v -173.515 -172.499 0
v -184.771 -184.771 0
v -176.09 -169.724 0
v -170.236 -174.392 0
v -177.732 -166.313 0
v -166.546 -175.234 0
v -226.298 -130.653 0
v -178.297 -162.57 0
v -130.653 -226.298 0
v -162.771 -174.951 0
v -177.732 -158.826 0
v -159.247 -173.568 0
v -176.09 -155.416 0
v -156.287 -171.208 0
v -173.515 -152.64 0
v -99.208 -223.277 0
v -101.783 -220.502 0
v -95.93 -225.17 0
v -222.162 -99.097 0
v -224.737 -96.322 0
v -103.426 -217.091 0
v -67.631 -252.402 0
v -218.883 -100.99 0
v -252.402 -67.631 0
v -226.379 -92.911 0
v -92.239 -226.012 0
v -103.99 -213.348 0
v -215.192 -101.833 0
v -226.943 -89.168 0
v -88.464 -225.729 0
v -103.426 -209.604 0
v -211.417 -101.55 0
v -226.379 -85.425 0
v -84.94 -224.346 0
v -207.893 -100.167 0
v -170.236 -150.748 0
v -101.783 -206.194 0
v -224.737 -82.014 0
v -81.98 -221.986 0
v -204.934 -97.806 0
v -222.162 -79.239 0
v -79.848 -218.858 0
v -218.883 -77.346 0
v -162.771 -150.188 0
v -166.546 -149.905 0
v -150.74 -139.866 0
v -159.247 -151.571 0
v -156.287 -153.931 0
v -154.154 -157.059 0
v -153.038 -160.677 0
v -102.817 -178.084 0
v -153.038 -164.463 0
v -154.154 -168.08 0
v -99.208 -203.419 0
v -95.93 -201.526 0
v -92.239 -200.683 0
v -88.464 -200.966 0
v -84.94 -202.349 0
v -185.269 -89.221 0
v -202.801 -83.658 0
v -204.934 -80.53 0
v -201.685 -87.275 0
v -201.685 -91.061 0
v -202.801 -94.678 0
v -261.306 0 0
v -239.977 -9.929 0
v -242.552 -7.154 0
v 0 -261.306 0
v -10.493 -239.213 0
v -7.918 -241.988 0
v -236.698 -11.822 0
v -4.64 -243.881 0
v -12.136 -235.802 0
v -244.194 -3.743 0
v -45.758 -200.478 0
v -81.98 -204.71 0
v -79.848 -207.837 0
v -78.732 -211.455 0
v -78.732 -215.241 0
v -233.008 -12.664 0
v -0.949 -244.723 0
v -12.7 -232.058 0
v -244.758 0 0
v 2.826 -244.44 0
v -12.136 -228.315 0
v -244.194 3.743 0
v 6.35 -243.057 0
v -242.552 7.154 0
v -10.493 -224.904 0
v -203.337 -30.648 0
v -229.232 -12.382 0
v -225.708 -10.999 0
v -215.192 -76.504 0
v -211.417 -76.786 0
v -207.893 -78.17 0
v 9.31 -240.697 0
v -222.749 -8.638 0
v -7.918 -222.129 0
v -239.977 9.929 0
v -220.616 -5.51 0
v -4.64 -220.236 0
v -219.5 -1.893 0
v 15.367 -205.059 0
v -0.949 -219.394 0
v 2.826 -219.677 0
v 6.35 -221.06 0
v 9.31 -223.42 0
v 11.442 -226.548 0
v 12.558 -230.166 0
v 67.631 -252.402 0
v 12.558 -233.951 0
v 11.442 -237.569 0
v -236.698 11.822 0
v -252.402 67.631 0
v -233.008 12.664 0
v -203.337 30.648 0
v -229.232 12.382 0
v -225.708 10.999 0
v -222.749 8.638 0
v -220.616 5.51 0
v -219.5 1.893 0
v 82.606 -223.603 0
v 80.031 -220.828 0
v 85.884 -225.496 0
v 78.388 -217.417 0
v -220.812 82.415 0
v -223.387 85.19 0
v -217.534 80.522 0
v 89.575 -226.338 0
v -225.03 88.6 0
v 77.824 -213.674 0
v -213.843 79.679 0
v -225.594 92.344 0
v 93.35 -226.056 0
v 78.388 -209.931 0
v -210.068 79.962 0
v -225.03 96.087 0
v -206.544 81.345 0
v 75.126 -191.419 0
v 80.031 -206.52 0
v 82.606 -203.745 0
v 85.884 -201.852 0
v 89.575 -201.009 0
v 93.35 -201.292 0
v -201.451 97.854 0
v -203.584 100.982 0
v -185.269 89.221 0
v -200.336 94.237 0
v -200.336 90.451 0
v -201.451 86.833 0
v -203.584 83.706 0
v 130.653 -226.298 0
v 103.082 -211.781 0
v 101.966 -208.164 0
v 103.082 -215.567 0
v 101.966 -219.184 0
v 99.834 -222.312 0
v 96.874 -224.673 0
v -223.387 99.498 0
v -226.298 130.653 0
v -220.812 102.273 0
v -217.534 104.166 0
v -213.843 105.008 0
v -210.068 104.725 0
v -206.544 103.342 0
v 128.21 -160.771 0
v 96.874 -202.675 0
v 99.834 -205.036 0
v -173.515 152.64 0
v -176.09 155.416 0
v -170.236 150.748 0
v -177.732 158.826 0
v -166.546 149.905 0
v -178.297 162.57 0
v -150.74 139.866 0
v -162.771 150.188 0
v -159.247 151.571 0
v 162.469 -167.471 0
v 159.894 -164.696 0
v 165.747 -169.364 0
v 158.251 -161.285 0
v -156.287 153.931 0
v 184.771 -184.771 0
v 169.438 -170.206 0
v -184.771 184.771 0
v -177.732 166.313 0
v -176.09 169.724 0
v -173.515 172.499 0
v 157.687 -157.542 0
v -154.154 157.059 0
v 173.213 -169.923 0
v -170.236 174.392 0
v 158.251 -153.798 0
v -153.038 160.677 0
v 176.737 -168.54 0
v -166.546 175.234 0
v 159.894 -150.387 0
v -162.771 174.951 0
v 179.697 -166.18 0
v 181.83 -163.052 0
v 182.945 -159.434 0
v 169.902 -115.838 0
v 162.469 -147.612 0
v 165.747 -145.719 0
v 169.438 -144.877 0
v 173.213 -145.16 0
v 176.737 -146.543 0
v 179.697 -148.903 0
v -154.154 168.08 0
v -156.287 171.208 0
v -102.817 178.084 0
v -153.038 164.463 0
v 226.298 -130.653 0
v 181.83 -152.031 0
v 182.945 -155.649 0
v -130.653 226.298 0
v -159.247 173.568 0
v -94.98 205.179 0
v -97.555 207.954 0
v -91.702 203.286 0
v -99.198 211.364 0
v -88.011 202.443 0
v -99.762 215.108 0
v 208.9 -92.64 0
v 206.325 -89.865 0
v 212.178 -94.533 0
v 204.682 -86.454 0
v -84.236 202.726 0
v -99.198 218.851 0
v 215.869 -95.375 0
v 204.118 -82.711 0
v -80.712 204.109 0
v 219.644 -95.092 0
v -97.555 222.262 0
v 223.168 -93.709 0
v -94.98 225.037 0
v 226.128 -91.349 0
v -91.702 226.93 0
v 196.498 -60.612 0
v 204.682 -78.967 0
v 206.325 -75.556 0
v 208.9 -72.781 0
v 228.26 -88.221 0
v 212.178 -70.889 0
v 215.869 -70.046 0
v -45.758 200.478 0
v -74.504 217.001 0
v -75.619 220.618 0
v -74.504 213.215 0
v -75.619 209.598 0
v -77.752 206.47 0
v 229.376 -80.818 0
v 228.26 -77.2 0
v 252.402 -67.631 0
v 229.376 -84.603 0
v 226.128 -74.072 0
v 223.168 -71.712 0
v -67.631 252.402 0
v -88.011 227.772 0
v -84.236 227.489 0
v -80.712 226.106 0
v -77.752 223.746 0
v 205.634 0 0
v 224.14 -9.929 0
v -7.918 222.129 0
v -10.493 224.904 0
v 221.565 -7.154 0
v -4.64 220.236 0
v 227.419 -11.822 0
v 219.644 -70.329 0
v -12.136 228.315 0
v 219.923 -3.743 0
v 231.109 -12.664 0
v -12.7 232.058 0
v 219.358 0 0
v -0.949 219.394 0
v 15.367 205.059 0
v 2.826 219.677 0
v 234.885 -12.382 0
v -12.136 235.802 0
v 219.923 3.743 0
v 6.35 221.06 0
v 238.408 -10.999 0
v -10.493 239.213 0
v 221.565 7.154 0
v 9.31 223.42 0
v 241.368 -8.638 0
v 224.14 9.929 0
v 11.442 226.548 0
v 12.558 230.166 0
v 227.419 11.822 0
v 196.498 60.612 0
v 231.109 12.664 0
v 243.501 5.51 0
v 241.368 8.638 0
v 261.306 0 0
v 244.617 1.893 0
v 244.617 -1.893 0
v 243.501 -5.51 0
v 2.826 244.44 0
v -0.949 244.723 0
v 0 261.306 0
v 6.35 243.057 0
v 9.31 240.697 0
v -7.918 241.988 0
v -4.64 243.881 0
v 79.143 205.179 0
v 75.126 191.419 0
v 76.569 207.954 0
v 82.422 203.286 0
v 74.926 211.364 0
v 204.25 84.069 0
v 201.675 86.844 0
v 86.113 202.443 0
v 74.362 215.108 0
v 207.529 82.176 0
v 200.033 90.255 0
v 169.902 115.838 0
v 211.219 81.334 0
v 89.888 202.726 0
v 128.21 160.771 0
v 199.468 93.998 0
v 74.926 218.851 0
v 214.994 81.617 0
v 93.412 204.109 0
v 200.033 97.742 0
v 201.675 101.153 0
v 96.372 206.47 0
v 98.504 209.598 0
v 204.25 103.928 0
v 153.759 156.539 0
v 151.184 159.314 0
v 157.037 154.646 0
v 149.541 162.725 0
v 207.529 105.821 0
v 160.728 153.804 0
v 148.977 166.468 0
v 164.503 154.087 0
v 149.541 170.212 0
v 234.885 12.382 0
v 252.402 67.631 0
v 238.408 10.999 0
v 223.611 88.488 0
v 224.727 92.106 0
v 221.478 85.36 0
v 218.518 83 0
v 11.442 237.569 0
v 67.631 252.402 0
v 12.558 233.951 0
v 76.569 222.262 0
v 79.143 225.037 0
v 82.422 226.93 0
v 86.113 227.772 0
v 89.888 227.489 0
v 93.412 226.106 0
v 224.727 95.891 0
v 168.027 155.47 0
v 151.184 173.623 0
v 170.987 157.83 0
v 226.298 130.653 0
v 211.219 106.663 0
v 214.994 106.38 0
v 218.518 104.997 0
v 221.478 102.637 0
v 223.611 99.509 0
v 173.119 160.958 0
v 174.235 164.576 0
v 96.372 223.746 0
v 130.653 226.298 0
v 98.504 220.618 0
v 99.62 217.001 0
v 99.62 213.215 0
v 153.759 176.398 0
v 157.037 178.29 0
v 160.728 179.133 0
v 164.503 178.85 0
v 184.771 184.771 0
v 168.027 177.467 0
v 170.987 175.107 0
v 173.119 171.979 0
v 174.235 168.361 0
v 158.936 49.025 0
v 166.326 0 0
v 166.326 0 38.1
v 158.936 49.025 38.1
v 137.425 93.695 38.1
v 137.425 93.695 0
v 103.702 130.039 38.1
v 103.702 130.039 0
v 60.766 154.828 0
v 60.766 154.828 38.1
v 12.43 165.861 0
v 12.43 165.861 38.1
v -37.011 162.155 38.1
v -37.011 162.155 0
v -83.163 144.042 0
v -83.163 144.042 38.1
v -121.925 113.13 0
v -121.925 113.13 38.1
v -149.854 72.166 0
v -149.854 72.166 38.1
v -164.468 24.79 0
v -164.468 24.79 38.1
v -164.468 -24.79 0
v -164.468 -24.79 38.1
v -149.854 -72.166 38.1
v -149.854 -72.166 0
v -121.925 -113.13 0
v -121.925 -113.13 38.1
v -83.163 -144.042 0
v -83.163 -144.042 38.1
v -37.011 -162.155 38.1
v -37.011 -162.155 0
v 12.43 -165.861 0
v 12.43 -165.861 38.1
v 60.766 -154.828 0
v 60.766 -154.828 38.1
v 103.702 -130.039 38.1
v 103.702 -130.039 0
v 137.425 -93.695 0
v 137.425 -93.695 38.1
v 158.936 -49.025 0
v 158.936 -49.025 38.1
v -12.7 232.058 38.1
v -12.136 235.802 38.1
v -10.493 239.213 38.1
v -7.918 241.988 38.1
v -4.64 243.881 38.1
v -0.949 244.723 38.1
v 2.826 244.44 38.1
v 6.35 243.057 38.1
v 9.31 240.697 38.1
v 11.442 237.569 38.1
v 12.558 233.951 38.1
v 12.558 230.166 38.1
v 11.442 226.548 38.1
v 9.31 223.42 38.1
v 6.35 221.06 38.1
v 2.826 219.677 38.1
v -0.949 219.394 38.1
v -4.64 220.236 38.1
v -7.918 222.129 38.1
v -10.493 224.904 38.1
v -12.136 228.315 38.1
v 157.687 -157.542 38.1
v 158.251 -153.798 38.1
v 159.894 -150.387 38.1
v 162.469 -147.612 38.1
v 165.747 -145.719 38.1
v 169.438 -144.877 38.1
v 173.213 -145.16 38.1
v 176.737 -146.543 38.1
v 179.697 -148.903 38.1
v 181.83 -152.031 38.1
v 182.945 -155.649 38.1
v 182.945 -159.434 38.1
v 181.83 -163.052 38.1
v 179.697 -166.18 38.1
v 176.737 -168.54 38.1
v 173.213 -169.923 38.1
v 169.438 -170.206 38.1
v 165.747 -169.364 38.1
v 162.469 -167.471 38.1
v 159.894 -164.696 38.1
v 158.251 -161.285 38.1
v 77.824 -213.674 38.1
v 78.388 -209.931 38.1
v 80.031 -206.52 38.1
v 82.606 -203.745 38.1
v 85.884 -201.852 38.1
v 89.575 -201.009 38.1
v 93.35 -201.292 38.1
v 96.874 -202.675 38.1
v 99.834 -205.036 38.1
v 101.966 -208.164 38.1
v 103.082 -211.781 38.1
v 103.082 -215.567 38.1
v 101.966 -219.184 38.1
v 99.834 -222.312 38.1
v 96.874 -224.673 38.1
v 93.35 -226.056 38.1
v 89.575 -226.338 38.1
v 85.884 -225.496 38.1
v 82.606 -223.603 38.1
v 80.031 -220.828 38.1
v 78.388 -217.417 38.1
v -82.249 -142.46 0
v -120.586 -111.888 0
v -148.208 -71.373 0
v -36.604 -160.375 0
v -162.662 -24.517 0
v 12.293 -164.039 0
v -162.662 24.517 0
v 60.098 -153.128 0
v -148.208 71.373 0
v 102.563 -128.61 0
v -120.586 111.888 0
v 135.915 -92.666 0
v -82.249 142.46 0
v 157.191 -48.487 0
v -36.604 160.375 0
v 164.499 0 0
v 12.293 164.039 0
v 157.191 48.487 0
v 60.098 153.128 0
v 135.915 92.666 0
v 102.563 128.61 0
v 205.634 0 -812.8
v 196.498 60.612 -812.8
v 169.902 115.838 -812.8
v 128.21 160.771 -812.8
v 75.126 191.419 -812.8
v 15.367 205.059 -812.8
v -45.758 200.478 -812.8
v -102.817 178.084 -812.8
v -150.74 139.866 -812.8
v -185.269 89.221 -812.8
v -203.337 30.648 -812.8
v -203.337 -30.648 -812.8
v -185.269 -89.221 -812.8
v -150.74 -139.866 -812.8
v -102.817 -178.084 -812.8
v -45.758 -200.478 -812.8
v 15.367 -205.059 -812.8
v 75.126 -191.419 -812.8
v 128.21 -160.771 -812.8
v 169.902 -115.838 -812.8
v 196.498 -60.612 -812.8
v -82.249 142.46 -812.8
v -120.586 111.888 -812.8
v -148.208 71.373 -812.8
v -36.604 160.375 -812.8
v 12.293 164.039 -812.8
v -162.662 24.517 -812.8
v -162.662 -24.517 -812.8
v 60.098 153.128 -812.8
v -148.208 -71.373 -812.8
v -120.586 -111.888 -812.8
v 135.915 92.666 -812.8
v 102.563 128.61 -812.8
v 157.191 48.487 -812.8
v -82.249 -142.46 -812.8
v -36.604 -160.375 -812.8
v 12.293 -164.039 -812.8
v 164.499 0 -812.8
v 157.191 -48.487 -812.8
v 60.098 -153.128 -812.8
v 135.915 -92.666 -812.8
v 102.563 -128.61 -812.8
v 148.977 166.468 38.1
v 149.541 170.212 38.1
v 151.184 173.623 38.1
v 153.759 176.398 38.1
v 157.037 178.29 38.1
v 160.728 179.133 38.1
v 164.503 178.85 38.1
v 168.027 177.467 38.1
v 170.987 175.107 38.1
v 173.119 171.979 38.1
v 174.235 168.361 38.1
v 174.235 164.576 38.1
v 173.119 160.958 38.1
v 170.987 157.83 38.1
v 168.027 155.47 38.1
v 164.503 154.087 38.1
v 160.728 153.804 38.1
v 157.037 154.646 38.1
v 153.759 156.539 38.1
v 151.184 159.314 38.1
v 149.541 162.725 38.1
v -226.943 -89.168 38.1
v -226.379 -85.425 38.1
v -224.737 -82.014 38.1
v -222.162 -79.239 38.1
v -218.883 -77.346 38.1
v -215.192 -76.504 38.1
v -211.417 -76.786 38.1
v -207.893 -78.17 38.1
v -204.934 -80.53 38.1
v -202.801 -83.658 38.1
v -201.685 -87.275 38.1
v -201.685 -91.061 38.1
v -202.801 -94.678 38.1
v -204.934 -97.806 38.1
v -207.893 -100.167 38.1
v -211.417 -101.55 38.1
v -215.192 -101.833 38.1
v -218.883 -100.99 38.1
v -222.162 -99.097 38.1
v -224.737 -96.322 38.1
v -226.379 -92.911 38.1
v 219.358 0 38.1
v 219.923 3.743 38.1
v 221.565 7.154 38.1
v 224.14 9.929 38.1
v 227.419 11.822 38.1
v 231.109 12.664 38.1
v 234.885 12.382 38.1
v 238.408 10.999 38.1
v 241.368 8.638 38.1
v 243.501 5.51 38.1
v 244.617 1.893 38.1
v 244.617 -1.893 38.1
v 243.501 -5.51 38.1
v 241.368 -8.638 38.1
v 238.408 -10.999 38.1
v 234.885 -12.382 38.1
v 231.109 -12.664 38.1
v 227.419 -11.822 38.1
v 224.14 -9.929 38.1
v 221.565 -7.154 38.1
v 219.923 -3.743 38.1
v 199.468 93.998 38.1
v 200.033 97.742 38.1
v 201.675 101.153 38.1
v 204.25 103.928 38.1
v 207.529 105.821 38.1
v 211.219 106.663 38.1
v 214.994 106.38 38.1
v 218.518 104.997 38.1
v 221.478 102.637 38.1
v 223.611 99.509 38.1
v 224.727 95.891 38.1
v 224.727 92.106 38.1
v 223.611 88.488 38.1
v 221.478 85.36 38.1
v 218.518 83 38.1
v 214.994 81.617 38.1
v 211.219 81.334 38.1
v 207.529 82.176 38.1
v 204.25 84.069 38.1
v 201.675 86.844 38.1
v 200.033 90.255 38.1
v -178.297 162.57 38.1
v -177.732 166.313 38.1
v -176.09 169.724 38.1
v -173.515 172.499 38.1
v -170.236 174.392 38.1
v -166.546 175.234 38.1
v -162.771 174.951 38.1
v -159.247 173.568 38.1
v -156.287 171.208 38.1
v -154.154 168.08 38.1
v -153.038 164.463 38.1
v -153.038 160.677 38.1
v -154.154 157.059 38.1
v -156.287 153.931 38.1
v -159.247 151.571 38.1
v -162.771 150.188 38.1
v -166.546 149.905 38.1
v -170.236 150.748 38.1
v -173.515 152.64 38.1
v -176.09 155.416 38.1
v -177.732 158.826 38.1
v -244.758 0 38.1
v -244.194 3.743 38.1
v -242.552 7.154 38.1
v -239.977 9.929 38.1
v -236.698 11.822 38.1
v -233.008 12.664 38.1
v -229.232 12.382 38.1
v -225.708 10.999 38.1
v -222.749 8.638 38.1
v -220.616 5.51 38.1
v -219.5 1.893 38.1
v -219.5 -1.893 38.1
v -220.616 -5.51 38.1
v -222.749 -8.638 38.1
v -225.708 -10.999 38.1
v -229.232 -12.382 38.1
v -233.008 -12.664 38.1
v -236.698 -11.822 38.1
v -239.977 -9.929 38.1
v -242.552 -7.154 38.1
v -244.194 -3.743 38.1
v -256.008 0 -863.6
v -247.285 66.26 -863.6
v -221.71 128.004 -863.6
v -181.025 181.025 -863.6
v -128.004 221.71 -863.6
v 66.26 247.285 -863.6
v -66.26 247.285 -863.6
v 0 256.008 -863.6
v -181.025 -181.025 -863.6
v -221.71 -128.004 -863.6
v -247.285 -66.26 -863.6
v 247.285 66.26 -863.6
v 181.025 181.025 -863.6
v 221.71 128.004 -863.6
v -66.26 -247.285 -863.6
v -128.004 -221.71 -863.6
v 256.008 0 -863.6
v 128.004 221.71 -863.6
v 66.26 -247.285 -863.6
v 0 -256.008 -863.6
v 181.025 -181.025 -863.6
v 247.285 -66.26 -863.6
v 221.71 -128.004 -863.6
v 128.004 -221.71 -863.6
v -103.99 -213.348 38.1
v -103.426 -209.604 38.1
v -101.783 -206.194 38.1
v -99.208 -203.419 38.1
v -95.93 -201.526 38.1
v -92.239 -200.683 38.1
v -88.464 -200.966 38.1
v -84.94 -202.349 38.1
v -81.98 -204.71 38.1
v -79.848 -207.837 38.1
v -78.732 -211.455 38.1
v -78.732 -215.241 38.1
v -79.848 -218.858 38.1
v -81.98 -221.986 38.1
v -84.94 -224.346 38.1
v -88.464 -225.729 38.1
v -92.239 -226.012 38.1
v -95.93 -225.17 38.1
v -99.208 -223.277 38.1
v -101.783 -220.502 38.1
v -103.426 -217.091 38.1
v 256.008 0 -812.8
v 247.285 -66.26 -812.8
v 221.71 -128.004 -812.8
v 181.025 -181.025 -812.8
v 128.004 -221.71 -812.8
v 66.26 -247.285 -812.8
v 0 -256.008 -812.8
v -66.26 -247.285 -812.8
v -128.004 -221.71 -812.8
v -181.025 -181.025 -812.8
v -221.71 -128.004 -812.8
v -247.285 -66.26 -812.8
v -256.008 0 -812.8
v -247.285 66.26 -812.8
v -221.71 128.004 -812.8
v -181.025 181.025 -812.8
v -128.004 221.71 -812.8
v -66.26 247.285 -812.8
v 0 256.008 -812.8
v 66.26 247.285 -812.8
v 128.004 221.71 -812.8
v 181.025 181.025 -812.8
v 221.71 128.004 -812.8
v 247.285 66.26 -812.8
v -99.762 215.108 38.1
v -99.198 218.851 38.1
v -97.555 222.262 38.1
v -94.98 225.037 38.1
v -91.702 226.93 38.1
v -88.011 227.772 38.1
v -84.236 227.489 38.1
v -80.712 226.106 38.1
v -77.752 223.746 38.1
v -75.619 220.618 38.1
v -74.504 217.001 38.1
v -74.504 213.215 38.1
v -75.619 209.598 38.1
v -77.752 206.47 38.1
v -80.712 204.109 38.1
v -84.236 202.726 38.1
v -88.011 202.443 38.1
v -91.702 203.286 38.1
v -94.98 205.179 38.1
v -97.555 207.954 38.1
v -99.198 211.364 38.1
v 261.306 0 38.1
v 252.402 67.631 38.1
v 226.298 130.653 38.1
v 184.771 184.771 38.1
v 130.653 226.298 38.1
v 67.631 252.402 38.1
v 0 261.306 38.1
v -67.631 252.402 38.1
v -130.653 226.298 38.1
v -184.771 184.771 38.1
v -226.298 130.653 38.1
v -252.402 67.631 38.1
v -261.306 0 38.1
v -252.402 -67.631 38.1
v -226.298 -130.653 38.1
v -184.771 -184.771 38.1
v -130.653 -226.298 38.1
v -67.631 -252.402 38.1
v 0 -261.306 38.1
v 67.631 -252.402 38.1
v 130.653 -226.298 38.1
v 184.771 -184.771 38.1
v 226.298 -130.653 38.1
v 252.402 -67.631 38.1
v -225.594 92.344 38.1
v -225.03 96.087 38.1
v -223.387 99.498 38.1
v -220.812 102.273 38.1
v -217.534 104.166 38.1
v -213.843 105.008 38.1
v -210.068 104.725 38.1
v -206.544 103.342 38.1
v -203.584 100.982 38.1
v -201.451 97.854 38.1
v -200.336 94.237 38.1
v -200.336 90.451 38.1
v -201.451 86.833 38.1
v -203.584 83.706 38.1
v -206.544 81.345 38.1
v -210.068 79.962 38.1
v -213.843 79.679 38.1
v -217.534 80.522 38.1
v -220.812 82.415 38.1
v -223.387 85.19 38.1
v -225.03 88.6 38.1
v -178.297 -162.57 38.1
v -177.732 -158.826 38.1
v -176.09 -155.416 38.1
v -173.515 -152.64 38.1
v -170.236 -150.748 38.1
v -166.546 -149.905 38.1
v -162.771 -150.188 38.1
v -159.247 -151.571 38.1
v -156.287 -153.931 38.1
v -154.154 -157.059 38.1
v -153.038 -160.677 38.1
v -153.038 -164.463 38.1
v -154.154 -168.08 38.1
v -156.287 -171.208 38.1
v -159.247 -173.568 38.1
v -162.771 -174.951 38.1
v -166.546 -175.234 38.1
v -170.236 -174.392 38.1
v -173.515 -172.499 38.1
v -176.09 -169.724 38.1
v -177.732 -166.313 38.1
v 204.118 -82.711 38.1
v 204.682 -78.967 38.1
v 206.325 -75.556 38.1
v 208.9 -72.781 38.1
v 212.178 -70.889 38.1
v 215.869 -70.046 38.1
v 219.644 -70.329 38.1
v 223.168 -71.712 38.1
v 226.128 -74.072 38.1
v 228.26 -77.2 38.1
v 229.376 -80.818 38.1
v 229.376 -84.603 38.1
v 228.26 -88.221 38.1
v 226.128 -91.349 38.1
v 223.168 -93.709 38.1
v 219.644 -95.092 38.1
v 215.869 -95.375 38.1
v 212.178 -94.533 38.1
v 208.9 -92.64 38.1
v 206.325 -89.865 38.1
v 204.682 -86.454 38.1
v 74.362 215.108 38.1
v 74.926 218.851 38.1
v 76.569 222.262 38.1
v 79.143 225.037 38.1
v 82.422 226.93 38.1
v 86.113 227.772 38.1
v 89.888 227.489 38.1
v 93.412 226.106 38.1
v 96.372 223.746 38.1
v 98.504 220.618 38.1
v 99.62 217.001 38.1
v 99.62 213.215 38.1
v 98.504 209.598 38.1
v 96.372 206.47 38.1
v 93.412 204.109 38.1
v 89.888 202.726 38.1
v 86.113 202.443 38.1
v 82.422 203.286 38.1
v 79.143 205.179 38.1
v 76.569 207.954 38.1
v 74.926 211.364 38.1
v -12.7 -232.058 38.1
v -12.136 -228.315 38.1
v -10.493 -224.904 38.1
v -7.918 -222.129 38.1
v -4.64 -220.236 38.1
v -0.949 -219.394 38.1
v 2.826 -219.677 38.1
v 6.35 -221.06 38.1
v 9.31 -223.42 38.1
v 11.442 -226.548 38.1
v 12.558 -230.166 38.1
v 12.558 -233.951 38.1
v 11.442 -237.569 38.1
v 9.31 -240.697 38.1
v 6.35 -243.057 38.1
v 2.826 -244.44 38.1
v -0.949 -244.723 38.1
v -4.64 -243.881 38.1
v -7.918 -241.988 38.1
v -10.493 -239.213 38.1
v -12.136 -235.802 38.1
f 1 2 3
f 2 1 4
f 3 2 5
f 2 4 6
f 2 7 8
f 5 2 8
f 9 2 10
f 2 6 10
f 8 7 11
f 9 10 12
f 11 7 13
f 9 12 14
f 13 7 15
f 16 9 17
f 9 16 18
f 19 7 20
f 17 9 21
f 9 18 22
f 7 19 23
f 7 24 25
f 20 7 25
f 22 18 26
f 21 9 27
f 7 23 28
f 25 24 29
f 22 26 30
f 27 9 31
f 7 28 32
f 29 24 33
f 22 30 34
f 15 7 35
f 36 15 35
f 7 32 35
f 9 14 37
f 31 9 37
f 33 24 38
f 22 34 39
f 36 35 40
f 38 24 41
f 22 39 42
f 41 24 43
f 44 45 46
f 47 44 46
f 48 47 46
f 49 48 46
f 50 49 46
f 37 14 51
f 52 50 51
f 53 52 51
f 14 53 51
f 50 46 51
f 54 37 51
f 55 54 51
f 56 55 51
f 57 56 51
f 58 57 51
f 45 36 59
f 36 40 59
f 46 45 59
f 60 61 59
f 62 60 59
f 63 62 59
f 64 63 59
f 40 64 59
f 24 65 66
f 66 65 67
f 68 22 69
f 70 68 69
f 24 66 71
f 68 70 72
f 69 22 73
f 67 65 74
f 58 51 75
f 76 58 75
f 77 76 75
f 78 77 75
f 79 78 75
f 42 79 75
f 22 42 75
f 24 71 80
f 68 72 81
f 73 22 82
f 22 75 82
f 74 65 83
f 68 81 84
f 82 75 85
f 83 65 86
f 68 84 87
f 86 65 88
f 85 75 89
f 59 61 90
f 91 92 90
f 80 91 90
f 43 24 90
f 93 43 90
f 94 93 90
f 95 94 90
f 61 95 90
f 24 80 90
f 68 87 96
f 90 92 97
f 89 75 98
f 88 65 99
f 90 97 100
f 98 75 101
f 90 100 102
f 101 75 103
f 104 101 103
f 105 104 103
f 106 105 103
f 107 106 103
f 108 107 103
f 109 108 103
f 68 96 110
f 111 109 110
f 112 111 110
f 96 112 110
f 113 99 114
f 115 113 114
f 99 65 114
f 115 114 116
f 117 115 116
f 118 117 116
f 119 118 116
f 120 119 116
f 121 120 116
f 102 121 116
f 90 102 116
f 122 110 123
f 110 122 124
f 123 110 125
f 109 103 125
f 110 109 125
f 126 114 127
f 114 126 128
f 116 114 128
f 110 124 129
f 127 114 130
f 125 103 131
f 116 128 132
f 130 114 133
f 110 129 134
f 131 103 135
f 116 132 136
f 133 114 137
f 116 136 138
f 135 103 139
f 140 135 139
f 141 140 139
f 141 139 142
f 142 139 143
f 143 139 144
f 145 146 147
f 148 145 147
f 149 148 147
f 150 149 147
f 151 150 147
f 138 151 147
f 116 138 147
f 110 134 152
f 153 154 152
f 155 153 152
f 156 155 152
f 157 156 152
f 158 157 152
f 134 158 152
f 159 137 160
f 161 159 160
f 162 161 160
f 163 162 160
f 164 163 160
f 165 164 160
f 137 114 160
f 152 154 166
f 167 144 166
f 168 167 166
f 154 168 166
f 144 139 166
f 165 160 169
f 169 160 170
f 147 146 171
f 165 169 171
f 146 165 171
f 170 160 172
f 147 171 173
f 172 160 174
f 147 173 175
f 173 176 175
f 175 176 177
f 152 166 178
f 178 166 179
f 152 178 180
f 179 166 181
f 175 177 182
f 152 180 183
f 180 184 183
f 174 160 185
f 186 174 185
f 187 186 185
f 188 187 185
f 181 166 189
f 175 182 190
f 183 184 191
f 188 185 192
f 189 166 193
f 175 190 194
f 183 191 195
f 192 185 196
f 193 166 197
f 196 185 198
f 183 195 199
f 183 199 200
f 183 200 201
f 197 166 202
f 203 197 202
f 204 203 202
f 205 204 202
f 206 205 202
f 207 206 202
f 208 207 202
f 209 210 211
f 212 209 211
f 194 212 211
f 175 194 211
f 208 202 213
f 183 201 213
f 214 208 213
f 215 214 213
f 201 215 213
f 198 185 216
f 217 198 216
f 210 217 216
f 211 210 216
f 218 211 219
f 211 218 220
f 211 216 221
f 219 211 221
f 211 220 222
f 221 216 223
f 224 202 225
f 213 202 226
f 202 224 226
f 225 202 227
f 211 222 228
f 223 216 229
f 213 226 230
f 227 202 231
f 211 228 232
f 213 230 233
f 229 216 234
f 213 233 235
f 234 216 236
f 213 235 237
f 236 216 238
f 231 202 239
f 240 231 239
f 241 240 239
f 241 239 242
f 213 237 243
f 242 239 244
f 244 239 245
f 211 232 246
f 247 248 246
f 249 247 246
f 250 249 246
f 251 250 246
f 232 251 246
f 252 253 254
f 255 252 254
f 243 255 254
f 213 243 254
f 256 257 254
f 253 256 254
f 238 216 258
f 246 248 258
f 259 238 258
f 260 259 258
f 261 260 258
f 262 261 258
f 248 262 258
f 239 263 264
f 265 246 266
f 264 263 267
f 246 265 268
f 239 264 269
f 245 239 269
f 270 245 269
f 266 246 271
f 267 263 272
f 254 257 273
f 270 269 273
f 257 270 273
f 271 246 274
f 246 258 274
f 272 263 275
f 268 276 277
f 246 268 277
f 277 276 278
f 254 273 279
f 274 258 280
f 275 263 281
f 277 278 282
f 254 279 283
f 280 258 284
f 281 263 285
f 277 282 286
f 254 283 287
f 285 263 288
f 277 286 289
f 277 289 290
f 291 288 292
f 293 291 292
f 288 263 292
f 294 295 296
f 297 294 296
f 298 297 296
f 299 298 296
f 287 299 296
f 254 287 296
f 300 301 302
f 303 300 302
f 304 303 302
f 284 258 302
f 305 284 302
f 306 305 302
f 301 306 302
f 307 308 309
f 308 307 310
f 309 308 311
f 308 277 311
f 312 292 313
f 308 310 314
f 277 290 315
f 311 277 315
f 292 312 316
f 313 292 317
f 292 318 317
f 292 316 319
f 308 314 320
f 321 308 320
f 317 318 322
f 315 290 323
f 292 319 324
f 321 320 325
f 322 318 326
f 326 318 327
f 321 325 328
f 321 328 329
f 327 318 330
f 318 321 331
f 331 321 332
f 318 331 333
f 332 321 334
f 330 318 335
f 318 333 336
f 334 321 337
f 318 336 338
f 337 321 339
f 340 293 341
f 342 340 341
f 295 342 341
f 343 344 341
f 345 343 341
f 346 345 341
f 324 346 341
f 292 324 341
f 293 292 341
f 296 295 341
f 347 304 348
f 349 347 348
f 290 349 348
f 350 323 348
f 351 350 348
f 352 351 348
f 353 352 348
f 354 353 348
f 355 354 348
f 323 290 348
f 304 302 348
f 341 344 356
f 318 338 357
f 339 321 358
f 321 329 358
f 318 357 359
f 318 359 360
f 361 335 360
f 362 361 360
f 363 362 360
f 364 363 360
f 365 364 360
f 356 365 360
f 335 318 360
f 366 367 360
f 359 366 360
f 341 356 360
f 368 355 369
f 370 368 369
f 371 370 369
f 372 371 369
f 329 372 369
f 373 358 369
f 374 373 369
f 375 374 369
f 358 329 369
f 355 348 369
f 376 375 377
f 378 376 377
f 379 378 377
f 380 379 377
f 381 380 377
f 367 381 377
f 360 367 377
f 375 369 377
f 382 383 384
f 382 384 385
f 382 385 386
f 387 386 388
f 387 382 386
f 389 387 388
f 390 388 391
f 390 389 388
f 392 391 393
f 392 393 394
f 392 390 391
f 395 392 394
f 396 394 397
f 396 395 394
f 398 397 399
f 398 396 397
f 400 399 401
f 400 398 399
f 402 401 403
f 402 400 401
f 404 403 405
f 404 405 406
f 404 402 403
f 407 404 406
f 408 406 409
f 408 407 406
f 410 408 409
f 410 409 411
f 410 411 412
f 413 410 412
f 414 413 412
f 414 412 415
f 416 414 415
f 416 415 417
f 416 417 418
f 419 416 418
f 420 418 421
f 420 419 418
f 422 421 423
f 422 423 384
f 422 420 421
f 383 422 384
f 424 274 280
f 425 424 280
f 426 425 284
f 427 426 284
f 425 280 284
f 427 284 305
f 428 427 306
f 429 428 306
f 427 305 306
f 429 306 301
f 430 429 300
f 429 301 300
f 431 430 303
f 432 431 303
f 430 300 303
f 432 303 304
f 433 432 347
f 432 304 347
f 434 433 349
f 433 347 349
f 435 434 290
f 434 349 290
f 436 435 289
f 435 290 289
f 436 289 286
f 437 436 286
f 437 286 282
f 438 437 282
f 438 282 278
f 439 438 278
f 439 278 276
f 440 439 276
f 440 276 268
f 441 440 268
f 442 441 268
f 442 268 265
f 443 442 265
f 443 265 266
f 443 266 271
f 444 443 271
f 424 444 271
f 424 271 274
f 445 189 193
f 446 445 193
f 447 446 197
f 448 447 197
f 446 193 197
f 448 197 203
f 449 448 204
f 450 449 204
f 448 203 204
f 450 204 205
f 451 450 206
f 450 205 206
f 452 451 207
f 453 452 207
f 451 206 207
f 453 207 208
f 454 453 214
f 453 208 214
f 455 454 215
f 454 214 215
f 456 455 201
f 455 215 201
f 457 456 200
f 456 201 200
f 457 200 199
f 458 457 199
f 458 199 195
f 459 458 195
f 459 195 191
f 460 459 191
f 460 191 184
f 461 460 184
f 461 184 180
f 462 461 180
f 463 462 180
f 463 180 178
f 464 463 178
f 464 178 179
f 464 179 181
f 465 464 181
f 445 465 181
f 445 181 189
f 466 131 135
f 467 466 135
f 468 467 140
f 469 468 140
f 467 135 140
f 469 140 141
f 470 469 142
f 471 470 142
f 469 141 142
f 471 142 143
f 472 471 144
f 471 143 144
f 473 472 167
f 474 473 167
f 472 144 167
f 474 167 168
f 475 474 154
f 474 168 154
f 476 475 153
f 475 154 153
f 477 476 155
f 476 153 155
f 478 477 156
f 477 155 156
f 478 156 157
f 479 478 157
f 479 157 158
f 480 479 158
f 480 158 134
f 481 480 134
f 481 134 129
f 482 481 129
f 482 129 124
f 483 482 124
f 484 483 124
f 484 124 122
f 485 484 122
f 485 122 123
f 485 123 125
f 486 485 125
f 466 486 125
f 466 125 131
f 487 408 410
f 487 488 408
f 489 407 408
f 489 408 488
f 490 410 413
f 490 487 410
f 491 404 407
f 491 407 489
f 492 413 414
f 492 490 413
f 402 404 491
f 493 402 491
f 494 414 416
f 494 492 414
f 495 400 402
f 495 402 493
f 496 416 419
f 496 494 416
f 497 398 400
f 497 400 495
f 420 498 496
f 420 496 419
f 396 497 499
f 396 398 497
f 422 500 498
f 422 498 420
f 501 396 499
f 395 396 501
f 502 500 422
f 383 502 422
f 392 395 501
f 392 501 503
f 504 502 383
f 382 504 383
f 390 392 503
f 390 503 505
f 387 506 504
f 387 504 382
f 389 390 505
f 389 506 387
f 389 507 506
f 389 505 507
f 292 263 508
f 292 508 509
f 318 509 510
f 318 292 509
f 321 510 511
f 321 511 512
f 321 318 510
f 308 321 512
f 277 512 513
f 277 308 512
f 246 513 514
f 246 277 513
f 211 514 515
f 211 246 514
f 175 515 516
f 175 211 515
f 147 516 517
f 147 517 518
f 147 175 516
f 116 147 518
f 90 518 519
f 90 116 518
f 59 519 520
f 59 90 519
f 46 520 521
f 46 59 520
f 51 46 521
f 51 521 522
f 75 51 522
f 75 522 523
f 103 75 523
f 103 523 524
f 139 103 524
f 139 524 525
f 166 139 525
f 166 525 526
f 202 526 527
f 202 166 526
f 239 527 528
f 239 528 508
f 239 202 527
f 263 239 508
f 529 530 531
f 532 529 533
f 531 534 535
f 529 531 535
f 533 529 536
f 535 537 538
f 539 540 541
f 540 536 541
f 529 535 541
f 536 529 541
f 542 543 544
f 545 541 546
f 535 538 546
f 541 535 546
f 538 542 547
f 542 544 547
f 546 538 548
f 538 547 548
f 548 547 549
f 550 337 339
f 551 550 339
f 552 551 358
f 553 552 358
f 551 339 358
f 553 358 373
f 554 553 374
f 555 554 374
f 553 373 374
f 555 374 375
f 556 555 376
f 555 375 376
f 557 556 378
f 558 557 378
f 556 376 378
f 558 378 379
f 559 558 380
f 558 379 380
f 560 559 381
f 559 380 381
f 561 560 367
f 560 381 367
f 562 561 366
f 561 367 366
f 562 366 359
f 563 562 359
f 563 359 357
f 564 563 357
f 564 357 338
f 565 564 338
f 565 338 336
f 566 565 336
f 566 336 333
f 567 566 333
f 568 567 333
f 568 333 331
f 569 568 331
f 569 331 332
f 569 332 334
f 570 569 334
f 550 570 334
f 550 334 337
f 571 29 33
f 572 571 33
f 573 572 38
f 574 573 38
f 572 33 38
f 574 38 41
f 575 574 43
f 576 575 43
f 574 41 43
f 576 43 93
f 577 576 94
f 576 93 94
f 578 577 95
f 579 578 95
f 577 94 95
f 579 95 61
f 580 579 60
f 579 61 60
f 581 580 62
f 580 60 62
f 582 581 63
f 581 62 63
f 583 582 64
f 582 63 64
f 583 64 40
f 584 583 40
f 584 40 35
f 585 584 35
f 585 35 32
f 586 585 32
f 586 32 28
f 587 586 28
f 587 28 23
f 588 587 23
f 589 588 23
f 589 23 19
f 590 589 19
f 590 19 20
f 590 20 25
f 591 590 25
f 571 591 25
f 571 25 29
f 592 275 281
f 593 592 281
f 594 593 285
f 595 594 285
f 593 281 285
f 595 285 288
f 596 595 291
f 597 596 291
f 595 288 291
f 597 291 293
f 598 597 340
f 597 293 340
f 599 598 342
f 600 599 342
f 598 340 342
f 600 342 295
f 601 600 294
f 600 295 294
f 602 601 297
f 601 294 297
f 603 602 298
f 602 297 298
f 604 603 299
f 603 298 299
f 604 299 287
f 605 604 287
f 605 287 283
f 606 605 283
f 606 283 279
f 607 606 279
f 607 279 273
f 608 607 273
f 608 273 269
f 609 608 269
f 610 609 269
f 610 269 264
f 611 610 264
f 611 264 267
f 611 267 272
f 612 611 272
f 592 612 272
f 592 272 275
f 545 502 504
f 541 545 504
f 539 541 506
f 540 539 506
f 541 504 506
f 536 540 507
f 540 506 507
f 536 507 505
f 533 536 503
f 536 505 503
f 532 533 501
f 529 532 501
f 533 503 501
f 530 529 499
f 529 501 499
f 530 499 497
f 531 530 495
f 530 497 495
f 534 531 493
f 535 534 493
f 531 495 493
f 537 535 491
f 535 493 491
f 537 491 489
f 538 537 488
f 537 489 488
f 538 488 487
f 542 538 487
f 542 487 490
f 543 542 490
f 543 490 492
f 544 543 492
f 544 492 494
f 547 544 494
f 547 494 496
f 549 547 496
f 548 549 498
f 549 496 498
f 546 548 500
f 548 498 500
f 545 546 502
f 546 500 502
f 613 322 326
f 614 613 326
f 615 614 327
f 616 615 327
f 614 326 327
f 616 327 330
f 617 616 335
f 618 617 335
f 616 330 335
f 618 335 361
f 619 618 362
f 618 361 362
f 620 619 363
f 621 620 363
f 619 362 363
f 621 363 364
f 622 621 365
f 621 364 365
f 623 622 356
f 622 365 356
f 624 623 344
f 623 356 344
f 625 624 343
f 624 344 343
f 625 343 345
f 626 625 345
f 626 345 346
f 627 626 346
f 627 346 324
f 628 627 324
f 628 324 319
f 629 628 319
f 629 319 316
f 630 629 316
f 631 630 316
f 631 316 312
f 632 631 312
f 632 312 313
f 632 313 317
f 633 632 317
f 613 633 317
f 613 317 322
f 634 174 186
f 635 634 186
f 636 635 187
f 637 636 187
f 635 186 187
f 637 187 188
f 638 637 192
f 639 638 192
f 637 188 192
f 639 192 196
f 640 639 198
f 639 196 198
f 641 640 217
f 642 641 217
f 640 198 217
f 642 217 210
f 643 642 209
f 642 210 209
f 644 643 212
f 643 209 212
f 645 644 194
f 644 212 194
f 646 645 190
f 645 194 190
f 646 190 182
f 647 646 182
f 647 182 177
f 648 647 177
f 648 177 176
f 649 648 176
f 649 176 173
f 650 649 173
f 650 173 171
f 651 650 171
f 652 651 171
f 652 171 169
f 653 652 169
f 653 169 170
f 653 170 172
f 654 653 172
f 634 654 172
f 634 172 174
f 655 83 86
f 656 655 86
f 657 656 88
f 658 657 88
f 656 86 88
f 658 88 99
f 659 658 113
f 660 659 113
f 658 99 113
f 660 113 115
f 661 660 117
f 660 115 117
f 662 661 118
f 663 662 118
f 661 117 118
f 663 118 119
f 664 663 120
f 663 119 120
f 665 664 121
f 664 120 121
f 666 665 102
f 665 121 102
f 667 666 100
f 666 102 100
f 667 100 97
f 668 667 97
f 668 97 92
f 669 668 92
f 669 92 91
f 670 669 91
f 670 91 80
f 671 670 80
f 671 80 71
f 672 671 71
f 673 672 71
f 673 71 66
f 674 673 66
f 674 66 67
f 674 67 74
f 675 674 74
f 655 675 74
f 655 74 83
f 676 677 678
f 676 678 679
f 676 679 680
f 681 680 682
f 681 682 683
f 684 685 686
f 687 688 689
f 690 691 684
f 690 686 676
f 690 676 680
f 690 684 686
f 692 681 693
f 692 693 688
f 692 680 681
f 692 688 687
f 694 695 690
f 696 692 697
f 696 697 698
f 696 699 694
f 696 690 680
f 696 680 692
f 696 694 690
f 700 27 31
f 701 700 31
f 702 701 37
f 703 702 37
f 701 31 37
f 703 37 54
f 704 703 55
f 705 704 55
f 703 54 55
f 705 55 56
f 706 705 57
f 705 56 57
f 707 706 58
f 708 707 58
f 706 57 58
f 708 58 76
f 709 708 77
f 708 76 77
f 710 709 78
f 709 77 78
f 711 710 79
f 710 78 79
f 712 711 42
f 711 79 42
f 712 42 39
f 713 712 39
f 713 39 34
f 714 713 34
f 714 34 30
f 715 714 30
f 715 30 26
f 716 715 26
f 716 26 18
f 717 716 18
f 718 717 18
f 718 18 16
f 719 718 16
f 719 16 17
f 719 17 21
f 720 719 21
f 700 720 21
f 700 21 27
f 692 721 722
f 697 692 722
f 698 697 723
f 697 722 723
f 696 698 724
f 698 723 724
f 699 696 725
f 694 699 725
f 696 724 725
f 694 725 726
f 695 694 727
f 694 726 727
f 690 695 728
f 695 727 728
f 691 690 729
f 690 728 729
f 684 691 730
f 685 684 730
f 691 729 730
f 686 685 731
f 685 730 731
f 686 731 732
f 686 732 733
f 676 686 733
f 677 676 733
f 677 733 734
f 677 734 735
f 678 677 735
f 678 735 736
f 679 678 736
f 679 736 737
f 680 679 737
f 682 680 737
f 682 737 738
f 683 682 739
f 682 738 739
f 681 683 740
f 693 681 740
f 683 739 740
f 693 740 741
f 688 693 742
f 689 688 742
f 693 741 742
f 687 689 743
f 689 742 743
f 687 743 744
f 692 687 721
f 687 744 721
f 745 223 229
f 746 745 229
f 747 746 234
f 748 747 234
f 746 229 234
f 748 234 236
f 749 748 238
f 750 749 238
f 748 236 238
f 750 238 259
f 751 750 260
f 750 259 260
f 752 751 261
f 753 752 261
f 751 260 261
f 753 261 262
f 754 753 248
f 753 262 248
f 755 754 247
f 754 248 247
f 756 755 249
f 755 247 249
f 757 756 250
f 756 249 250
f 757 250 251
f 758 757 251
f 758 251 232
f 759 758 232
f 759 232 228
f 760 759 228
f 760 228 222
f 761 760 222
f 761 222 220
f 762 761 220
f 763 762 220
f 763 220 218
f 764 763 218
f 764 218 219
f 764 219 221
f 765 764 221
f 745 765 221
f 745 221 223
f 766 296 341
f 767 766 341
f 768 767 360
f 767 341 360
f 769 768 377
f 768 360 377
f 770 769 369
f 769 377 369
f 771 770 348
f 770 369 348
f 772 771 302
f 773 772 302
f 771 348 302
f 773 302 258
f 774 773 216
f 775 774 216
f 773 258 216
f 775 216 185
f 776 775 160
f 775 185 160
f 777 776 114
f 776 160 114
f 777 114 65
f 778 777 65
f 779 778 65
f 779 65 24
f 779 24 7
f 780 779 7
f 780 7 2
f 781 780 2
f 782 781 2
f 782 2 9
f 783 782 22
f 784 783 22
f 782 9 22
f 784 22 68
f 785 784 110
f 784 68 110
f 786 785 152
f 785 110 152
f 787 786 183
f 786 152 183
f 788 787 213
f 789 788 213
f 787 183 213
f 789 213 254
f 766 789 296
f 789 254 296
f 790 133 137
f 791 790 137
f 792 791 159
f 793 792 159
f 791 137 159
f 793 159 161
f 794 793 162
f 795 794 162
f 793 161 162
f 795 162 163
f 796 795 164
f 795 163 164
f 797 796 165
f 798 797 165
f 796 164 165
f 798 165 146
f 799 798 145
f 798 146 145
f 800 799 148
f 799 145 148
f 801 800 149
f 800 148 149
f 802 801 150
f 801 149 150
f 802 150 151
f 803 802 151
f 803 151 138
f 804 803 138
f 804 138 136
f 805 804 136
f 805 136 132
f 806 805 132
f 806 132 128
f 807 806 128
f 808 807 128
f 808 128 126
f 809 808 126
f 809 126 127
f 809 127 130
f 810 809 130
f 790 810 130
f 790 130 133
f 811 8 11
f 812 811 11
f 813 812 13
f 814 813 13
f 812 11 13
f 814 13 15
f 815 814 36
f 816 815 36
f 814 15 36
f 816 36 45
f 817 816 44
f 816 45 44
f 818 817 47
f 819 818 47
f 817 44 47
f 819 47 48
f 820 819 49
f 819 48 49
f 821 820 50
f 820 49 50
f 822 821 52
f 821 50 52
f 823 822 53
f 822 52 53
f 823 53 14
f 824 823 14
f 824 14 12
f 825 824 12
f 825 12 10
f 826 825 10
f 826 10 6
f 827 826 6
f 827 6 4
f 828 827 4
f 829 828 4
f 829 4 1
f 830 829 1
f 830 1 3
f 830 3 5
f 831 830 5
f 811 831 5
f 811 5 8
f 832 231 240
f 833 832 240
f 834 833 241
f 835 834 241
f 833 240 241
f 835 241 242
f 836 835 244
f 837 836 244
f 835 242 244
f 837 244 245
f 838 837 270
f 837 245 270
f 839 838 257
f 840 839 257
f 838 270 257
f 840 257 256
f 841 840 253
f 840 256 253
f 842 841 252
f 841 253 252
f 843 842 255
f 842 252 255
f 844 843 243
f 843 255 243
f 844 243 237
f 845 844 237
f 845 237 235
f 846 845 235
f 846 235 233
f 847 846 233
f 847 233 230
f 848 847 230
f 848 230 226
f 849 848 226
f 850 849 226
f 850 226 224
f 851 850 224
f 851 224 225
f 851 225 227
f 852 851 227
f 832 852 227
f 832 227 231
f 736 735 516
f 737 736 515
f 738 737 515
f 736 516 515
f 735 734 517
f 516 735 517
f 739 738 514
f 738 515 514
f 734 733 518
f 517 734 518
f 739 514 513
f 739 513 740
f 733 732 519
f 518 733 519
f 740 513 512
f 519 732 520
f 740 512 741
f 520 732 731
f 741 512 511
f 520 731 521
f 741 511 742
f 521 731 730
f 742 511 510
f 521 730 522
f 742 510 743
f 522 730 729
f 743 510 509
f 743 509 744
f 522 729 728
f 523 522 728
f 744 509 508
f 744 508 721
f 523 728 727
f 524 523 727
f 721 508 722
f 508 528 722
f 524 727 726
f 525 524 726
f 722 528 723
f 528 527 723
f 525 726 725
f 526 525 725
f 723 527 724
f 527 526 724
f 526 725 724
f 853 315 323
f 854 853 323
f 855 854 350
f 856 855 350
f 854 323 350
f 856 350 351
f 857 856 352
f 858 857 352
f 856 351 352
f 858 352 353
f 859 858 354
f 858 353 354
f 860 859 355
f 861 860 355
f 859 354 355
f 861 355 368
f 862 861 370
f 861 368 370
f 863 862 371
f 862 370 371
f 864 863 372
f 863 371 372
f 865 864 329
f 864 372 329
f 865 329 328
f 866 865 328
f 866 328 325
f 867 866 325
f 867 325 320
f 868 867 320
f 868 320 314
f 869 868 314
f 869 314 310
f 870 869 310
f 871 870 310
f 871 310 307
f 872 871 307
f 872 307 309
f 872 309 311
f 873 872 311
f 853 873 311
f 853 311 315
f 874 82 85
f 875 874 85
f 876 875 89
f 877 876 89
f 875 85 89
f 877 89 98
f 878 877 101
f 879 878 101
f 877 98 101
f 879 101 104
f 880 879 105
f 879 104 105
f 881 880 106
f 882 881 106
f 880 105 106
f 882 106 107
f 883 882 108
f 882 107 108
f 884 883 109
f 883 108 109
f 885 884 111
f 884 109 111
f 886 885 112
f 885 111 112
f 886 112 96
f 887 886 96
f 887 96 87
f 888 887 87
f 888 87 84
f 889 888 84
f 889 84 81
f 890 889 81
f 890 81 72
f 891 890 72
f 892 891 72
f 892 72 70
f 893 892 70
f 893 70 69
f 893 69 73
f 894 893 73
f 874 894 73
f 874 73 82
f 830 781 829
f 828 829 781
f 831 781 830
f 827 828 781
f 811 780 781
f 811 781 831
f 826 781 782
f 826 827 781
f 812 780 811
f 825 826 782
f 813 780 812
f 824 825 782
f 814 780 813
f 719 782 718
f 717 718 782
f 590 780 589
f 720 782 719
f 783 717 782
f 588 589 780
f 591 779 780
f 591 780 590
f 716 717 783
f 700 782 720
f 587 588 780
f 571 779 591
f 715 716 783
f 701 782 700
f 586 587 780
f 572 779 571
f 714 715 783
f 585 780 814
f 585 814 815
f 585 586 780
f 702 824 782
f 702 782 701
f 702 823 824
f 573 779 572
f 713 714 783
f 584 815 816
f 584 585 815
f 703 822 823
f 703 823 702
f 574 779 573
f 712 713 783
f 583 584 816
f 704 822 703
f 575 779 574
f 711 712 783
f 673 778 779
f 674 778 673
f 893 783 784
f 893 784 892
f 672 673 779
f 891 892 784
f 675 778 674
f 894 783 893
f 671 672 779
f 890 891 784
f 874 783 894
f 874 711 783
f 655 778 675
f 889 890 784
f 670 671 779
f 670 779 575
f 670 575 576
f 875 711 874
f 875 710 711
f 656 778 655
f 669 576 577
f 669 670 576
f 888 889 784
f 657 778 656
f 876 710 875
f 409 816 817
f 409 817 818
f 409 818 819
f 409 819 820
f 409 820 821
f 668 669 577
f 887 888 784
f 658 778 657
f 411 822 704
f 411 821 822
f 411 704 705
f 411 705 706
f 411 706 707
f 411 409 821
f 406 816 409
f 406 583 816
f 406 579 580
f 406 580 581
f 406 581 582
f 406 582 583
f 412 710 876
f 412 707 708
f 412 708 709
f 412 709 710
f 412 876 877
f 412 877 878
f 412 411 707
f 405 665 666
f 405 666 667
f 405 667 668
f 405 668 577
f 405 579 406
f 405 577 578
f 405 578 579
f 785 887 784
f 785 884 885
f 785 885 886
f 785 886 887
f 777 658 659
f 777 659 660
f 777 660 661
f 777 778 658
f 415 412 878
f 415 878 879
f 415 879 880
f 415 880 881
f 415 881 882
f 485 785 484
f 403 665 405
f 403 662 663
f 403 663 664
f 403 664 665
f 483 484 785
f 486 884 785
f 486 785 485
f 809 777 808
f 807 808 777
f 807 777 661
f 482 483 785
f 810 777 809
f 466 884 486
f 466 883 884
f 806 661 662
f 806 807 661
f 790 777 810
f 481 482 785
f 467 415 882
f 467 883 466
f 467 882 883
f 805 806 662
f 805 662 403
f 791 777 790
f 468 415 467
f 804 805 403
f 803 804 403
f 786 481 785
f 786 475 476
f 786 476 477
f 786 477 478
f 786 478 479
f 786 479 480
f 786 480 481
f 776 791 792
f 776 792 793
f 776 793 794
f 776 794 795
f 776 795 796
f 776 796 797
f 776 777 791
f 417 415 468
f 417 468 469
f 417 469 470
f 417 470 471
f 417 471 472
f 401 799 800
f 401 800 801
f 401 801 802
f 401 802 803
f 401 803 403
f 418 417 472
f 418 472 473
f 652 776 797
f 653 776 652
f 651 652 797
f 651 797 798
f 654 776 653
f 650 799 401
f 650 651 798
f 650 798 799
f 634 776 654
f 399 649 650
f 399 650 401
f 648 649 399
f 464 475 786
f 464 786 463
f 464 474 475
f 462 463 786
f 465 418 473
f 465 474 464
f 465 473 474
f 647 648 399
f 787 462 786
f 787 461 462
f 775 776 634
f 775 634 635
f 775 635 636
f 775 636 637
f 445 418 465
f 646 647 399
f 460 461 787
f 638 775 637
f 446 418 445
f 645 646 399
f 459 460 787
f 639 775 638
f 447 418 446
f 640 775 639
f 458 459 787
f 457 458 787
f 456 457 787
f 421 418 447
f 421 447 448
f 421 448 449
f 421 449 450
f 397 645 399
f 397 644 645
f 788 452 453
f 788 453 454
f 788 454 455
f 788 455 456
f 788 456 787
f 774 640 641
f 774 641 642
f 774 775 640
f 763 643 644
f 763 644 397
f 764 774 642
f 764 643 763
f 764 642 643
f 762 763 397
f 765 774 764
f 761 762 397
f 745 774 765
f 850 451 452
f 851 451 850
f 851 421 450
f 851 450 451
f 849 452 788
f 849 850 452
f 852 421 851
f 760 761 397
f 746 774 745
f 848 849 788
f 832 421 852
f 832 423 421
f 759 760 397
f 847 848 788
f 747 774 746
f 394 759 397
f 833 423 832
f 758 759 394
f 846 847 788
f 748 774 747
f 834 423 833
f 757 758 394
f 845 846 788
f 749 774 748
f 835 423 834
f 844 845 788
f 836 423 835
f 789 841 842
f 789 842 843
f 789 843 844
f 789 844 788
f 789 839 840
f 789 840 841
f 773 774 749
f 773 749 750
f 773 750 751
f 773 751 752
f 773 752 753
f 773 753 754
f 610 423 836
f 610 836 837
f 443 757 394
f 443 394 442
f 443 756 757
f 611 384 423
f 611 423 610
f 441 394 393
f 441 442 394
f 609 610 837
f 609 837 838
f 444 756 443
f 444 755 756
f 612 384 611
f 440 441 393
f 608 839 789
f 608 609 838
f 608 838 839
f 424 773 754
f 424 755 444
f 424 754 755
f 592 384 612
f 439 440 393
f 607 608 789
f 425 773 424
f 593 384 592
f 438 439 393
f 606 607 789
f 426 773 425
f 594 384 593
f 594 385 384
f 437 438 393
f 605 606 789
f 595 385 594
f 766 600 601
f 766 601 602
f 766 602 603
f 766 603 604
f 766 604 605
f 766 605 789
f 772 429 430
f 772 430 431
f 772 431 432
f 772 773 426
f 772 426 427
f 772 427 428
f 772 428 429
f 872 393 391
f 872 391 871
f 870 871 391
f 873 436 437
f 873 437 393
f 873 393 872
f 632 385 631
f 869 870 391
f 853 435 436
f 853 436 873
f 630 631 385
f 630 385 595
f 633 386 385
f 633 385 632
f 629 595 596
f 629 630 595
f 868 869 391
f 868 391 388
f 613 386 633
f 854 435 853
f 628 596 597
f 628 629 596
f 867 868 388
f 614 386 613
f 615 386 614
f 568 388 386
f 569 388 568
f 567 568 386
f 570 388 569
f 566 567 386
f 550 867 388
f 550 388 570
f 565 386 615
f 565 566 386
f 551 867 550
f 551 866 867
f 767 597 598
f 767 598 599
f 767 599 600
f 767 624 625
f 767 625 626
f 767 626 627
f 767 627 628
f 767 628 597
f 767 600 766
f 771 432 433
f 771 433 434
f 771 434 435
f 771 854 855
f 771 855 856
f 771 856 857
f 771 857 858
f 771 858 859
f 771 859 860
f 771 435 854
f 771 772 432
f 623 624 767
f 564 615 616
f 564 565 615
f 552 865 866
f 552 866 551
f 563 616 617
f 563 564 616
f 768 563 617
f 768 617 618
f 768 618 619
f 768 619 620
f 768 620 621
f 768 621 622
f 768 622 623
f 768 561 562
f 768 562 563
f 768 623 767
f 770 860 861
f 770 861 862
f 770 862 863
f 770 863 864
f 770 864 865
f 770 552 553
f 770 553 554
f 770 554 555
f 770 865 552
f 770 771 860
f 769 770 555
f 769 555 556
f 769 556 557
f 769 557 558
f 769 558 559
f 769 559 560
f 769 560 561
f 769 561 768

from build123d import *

# Parameters (mm, degrees)
F0_R     = 205.633552
F0_R_2   = 164.498916
F1_DEPTH = 812.8
F2_R     = 256.008215
F3_DEPTH = 50.8
F4_R     = 261.306148
F4_R_2   = 166.325604
F5_DEPTH = 38.1
F7_D     = 25.4
F7_DEPTH = 50.8


with BuildPart() as f1:
    # F0 (on Top) → F1 (new body)
    with BuildSketch(Plane.XY):
        Circle(F0_R)
        Circle(F0_R_2, mode=Mode.SUBTRACT)
    extrude(amount=-F1_DEPTH)

    # F2 (on face) → F3 (join)
    with BuildSketch(Plane(origin=(0, 0, -812.8), x_dir=(1, 0, 0), z_dir=(0, 0, -1))):
        Circle(F2_R)
    extrude(amount=F3_DEPTH)

    # F4 (on face) → F5 (join)
    with BuildSketch(Plane.XY):
        Circle(F4_R)
        Circle(F4_R_2, mode=Mode.SUBTRACT)
    extrude(amount=F5_DEPTH)

    # F7
    with Locations(Plane.XY.offset(38.1)):
        with Locations((87.061769, 215.107856), (161.676934, 166.468347), (212.168418, 93.998425), (232.058487, 0), (216.818106, -82.710644), (170.387229, -157.54153), (90.523878, -213.673978), (0, -232.058487), (-91.290017, -213.347778), (-165.596627, -162.569673), (-214.243309, -89.168077), (-232.058487, 0), (-212.893799, 92.34377), (-165.596627, 162.569673), (-87.061769, 215.107856), (0, 232.058487)):
            Hole(F7_D / 2, depth=F7_DEPTH)


solid = f1.part
